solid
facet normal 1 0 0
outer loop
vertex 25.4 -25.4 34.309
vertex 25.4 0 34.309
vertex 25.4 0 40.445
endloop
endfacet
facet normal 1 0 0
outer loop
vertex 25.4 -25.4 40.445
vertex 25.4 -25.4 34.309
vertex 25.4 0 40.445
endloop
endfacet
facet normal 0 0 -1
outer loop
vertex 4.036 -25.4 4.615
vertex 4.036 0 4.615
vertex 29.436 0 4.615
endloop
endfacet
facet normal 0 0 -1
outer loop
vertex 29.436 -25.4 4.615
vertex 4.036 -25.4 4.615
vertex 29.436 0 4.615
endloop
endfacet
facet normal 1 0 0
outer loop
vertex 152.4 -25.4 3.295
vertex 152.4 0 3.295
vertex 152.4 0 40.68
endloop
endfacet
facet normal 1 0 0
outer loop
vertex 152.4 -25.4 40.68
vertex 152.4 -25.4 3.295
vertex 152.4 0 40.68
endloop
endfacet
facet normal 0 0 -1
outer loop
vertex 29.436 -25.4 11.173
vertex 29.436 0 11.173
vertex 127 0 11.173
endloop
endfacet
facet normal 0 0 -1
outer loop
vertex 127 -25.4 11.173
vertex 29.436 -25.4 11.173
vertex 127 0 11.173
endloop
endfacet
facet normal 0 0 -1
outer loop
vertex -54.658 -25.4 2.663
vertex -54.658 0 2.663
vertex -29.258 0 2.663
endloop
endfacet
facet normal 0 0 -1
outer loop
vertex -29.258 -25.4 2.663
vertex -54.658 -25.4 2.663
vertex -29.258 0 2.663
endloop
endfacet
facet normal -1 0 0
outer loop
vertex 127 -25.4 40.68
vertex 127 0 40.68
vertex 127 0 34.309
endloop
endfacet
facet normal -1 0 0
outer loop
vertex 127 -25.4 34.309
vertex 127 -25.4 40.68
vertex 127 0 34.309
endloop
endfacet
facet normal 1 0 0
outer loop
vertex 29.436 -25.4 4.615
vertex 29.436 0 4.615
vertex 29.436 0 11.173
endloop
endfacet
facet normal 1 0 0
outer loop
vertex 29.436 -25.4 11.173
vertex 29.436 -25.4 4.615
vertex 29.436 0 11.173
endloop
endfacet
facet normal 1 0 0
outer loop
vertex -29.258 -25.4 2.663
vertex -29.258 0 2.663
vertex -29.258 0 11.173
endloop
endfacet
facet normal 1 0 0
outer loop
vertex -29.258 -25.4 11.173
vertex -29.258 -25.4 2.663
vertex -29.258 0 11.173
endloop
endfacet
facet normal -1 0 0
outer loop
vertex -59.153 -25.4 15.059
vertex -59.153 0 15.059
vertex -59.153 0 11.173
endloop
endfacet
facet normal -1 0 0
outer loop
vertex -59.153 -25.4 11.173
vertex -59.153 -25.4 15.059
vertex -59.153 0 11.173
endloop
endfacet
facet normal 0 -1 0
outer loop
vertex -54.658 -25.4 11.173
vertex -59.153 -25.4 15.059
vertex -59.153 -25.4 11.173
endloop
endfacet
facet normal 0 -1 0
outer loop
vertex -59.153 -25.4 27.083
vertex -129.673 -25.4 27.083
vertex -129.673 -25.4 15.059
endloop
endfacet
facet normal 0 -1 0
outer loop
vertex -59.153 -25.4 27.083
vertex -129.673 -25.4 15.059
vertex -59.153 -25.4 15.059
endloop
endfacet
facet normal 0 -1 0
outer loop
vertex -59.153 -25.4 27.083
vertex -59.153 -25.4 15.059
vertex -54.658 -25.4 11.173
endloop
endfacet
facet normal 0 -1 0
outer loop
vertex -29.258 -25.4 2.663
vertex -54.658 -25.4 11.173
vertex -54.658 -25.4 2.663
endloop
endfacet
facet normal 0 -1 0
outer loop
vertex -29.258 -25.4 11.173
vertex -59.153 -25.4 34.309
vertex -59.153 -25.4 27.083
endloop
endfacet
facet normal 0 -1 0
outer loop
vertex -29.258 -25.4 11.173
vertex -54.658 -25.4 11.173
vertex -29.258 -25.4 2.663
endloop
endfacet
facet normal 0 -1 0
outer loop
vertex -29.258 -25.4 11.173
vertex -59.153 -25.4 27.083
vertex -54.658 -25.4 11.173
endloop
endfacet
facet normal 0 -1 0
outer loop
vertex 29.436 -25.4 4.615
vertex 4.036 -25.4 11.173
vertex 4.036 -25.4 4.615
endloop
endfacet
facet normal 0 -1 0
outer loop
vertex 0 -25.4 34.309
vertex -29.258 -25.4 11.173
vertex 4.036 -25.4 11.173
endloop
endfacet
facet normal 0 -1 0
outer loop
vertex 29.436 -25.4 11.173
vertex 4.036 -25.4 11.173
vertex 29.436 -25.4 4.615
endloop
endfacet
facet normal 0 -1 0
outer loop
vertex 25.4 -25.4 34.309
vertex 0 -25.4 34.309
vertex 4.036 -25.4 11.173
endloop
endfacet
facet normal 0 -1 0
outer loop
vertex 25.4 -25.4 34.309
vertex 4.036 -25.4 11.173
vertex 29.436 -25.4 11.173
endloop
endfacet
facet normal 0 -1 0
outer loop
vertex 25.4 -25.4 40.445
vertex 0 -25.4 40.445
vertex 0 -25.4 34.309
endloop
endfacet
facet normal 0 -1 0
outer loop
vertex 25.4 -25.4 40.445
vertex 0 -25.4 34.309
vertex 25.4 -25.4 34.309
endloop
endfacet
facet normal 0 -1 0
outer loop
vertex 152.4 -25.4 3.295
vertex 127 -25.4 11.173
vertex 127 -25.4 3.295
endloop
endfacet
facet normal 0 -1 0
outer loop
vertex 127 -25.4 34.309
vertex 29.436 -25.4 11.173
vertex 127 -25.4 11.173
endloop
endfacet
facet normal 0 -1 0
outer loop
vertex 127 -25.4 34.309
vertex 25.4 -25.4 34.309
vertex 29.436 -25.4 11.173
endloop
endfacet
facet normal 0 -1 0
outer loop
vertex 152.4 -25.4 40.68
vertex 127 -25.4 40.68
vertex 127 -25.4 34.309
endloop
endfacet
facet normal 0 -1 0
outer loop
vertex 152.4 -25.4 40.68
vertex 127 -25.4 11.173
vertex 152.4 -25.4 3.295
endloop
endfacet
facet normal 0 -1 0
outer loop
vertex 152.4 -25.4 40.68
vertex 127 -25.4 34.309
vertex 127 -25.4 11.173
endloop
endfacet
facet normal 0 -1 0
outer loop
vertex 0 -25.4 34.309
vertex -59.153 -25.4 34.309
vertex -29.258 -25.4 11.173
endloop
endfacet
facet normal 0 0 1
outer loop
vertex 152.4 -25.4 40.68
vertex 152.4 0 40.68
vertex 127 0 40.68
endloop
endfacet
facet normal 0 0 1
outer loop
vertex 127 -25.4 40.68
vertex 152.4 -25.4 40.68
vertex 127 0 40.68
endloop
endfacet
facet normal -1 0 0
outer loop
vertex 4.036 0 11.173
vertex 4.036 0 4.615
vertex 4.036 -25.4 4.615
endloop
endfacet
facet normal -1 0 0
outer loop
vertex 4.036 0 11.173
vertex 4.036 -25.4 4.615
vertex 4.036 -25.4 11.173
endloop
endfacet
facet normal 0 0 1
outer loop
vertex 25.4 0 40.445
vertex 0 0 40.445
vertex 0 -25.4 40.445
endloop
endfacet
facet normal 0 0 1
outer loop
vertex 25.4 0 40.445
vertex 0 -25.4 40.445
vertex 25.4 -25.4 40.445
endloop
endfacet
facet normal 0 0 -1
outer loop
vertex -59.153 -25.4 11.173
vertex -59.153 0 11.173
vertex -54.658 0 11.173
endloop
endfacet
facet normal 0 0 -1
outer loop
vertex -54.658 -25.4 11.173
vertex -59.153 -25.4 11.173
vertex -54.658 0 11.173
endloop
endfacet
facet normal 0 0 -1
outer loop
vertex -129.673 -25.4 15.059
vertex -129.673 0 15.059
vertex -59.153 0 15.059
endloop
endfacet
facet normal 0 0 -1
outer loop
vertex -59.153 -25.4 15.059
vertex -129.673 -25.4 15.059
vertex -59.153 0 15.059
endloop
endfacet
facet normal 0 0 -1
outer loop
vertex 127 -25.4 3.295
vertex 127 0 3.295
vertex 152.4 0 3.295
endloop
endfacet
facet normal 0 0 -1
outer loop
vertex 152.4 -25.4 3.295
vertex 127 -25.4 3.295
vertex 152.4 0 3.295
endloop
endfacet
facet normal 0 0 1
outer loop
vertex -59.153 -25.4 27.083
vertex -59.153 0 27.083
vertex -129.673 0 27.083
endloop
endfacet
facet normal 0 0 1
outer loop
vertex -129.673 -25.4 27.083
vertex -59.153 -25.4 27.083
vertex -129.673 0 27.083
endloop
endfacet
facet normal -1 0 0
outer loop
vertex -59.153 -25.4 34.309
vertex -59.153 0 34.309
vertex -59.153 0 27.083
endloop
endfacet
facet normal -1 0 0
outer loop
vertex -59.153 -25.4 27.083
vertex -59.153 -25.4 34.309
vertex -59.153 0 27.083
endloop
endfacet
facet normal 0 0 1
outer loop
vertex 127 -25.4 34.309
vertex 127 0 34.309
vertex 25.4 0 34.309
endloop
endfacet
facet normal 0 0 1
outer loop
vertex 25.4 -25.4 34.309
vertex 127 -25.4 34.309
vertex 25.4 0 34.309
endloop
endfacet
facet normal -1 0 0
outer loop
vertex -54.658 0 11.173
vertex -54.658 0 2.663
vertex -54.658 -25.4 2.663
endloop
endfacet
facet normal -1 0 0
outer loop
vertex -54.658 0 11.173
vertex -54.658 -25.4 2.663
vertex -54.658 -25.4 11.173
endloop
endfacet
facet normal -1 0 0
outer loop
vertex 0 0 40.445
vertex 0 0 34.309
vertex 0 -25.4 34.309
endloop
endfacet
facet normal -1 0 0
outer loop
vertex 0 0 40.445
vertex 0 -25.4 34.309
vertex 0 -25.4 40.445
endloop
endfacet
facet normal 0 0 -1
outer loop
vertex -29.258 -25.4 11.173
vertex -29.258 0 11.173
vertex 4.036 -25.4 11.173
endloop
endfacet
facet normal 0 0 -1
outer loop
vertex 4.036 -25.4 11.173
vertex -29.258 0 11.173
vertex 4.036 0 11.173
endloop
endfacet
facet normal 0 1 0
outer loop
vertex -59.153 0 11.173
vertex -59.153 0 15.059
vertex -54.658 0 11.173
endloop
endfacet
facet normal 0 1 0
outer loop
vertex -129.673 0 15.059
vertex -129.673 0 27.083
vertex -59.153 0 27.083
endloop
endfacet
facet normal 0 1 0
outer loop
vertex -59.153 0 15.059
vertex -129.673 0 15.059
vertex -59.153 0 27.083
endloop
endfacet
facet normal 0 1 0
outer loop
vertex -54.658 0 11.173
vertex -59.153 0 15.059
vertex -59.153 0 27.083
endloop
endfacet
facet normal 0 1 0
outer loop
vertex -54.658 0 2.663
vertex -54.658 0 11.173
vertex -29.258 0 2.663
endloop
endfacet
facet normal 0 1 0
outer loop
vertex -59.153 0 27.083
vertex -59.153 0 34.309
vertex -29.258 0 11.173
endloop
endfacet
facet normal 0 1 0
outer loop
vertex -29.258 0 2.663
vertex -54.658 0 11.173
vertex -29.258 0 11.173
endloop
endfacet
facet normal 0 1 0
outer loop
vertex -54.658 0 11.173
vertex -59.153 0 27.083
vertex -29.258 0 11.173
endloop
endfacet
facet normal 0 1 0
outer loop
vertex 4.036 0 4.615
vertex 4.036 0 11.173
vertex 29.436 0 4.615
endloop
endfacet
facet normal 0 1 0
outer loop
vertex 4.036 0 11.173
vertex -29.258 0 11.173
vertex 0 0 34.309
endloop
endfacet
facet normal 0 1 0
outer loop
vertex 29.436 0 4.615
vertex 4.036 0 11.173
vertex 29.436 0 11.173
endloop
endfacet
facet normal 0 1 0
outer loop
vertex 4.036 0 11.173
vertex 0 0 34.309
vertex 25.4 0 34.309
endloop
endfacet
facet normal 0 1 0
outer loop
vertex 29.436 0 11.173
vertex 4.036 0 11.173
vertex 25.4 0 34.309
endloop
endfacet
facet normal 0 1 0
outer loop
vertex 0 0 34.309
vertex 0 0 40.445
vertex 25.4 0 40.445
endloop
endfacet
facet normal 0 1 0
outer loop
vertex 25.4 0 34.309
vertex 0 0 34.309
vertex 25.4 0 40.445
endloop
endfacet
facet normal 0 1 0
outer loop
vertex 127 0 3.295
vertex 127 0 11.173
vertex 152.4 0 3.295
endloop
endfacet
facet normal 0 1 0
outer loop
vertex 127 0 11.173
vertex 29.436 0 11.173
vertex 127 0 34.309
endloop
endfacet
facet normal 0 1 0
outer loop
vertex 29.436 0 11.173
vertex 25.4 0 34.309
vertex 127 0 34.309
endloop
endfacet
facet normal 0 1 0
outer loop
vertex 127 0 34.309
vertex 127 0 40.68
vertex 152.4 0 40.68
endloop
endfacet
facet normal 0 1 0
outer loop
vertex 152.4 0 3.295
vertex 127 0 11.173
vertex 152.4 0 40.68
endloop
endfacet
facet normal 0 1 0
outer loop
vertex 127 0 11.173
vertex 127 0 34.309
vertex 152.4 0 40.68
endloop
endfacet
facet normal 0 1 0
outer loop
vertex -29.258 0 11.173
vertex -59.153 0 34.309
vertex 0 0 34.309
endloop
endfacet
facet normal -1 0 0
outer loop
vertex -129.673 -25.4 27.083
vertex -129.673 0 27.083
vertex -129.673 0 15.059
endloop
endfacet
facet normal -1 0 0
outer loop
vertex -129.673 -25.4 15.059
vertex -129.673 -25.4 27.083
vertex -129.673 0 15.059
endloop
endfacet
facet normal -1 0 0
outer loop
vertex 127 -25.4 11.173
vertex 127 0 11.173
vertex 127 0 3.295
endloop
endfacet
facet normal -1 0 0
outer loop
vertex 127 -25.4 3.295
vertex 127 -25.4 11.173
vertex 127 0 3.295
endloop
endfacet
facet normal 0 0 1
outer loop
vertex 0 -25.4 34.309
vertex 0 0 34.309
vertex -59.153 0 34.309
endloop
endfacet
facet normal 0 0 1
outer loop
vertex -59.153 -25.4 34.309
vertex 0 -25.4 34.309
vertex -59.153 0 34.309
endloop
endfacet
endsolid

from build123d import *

# Parameters (mm, degrees)
F0_W     = 25.4
F0_H     = 6.135838
F0_H_2   = 8.51089
F0_H_3   = 6.558549
F1_DEPTH = 25.4


with BuildPart() as f1:
    # F0 (on Front) → F1 (new body)
    with BuildSketch(Plane.XZ):
        Polygon((0, 34.30898), (-59.153413, 34.30898), (-59.153413, 27.082892), (-59.153413, 15.05862), (-59.153413, 11.173423), (-54.658122, 11.173423), (-29.258122, 11.173423), (4.035674, 11.173423), (29.435674, 11.173423), (84.918008, 11.173423), (84.918008, 34.30898), (25.4, 34.30898), align=None)
        with Locations((12.7, 37.376899)):
            Rectangle(F0_W, F0_H)
        Polygon((-59.153413, 15.05862), (-59.153413, 27.082892), (-129.672574, 27.082892), (-129.672574, 22.232148), (-129.672574, 15.05862), align=None)
        Polygon((127, 34.30898), (84.918008, 34.30898), (84.918008, 11.173423), (127, 11.173423), (127, 3.2947), (152.4, 3.2947), (152.4, 11.173423), (152.4, 34.30898), (152.4, 40.679562), (127, 40.679562), align=None)
        with Locations((-41.958122, 6.917978)):
            Rectangle(F0_W, F0_H_2)
        with Locations((16.735674, 7.894149)):
            Rectangle(F0_W, F0_H_3)
    extrude(amount=F1_DEPTH)


solid = f1.part
